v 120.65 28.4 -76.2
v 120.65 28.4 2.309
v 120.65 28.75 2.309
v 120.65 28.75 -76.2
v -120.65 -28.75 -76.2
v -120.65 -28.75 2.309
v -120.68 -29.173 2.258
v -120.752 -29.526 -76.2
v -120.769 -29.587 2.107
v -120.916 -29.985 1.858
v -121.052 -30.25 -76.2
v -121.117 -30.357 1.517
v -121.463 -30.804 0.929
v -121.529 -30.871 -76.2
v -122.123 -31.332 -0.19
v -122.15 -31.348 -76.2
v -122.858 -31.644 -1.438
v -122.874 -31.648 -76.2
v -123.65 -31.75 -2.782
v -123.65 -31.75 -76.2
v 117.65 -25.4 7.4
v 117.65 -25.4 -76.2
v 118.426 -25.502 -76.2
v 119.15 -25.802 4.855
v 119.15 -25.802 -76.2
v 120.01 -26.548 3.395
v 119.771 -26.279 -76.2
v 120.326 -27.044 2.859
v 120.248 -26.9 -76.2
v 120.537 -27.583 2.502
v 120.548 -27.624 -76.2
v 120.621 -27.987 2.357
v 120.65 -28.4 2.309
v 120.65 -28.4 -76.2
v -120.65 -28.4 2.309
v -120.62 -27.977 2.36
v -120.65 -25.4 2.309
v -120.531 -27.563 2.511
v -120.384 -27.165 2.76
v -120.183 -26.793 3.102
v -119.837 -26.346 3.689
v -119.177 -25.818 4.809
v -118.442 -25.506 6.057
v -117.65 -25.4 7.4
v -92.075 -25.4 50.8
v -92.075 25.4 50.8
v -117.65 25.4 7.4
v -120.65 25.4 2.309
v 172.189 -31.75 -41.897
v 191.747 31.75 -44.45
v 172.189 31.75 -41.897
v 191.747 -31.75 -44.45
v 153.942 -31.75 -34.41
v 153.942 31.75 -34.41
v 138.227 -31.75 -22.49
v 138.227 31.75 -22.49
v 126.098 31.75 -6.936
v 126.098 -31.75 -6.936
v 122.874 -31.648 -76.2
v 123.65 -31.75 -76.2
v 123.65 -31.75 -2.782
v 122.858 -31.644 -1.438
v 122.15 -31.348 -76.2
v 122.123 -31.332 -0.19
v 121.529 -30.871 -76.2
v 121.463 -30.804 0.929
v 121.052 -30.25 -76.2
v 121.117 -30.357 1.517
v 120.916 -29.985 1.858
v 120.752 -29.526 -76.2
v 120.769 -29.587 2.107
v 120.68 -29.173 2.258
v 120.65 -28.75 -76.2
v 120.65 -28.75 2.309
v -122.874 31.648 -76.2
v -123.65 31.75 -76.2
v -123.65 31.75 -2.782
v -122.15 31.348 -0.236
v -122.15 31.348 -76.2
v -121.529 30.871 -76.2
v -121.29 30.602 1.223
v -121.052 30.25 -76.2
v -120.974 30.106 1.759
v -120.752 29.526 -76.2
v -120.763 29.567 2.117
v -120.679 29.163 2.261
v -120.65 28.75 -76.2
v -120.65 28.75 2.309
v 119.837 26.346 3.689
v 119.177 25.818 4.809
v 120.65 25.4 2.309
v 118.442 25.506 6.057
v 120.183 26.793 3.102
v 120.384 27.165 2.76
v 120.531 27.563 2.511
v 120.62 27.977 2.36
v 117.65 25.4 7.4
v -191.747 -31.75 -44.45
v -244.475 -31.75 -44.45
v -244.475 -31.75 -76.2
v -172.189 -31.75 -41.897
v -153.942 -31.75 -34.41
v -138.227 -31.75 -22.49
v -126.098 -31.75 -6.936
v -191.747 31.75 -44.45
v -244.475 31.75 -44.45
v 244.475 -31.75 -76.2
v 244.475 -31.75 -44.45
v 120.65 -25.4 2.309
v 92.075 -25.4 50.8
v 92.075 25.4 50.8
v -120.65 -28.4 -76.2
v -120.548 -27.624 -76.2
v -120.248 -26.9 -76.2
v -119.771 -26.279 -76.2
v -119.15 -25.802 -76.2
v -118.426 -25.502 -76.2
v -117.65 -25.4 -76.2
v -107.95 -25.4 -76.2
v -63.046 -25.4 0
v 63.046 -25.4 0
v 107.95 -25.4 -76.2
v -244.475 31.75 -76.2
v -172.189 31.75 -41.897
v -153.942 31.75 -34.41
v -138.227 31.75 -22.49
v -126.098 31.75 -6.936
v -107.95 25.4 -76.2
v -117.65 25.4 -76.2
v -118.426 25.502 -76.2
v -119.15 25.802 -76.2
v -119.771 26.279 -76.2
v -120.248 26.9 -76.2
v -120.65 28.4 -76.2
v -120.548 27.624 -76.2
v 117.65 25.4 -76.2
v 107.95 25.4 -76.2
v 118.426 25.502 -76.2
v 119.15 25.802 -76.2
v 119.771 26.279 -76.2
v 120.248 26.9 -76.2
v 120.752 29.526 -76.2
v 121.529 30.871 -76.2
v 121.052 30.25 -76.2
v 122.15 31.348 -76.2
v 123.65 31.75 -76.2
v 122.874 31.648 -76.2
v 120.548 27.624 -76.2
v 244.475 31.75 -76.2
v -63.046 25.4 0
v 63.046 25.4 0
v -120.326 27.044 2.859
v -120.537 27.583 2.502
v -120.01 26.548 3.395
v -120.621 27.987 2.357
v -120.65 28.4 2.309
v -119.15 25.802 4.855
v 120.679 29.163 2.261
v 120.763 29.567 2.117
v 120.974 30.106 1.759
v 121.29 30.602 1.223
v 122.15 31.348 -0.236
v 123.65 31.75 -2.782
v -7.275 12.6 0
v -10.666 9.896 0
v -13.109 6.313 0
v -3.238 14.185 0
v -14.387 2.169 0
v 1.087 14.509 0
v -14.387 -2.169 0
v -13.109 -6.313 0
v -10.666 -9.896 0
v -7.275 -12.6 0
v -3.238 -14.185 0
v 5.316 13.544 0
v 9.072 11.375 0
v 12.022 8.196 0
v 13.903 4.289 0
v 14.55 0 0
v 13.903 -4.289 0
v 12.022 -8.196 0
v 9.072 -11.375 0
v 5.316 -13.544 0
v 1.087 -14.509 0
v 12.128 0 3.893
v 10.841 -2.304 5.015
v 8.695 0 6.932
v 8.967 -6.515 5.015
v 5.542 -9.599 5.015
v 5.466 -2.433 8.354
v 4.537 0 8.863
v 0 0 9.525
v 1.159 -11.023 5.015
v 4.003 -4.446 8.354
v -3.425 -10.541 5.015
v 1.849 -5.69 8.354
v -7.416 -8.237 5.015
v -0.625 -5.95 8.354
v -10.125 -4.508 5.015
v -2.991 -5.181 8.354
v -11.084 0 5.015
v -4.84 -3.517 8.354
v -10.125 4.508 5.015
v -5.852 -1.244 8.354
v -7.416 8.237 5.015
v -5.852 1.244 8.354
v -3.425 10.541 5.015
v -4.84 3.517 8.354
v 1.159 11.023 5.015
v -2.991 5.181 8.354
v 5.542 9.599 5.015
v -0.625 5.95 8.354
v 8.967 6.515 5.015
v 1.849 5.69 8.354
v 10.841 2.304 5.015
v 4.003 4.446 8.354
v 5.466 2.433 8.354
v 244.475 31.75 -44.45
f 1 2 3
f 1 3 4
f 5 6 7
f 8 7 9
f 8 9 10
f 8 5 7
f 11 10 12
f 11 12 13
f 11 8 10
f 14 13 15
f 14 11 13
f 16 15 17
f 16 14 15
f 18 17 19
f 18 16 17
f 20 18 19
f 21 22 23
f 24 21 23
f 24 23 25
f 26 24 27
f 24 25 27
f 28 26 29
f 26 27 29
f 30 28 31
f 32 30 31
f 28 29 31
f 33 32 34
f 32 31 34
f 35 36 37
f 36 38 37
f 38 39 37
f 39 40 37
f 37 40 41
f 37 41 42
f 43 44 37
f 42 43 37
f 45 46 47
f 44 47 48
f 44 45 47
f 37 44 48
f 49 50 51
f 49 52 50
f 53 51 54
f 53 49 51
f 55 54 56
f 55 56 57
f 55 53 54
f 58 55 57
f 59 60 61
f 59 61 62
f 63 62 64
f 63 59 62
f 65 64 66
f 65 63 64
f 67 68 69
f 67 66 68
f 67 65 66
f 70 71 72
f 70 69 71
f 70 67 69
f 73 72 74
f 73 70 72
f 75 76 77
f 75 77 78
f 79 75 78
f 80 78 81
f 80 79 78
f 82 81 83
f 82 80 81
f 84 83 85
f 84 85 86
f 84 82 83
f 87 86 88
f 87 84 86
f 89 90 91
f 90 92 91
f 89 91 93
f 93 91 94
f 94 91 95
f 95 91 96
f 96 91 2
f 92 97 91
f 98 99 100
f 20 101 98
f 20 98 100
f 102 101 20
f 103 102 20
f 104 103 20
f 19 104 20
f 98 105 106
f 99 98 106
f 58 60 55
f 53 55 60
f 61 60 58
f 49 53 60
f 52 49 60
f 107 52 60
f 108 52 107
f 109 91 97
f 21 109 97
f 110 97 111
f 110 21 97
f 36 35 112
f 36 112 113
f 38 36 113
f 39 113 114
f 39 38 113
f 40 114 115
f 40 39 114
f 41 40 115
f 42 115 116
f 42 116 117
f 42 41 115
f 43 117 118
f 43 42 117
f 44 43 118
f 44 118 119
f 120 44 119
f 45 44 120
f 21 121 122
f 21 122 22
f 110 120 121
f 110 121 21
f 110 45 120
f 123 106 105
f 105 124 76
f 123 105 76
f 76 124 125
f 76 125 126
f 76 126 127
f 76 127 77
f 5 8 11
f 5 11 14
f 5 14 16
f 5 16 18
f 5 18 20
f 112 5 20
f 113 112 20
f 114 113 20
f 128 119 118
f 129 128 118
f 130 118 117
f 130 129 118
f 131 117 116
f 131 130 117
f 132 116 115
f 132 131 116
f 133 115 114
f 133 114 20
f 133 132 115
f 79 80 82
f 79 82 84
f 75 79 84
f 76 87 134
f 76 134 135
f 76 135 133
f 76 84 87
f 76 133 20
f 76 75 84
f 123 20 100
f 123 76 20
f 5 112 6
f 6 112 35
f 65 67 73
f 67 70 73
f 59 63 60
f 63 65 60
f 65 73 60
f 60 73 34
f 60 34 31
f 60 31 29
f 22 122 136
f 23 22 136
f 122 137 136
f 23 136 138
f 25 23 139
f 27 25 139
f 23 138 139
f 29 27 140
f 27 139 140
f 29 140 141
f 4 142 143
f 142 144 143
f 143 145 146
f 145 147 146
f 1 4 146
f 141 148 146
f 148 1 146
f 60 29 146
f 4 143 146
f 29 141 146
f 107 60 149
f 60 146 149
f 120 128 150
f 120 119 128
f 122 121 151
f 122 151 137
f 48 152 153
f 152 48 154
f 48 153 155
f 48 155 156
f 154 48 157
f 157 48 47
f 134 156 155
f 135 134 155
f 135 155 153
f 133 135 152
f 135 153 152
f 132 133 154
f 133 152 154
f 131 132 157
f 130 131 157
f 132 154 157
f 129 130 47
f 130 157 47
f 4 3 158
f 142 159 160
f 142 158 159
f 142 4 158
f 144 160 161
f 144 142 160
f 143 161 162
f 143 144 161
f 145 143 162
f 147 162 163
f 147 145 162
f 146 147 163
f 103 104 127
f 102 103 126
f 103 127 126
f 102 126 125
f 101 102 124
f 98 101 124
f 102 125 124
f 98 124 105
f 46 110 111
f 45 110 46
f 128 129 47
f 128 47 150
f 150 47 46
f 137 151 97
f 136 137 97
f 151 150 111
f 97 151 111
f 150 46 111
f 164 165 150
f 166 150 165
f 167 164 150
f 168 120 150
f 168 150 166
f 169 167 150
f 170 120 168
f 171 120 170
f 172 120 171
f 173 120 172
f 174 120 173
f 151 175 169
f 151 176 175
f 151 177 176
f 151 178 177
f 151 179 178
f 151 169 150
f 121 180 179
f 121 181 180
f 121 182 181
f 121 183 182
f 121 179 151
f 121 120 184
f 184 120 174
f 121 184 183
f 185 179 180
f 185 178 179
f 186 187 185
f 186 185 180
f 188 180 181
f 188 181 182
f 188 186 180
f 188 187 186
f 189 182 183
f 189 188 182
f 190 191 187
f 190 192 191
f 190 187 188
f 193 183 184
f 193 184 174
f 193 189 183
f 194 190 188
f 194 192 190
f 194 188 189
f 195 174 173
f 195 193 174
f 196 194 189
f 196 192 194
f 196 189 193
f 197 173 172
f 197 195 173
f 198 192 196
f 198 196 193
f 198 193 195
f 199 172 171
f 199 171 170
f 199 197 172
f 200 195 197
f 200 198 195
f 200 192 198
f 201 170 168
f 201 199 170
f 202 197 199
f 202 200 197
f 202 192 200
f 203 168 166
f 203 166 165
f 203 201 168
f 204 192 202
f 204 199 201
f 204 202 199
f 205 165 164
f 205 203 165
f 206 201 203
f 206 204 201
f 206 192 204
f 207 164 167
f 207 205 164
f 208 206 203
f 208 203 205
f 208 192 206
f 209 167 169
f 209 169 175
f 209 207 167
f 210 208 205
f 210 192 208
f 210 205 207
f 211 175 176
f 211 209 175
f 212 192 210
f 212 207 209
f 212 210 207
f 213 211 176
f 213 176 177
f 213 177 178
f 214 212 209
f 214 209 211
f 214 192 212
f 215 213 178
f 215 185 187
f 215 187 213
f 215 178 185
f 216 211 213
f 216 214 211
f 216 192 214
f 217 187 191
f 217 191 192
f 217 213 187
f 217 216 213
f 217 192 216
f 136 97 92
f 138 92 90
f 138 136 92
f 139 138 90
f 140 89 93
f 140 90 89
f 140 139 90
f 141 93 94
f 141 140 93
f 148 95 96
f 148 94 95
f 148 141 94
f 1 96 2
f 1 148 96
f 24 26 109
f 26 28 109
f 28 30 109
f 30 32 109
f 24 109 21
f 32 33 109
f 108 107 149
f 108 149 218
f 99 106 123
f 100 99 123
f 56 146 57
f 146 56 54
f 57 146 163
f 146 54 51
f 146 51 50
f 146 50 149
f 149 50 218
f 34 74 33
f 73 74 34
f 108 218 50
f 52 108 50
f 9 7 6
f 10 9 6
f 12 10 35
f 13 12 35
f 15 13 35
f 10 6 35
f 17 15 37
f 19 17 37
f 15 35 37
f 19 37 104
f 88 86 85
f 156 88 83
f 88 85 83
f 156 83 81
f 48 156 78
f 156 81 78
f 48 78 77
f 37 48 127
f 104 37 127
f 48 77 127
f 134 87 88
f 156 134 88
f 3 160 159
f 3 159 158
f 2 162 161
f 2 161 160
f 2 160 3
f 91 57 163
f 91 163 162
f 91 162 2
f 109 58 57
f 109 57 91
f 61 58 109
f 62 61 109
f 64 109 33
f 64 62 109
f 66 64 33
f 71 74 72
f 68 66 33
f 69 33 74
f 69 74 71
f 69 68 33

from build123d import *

# Parameters (mm, degrees)
F1_DEPTH     = 25.4
F2_DEPTH     = 31.75
F3_T4_DEPTH  = 86.0090909091
F3_T9_DEPTH  = 86.0090909091
F3_T14_DEPTH = 86.0090909091
F3_T19_DEPTH = 86.0090909091
F3_T21_DEPTH = 93.5090909091


# Not quite as in the source:
# - a fillet or chamfer that OpenCascade refuses, or shapes differently, is made with other operations: its cross-section is extruded or revolved along the edge and cut away or added


with BuildPart() as f1:
    # F0 (on Front) → F1 (new body, symmetric)
    with BuildSketch(Plane.XZ):
        with BuildLine():
            Line((-107.95, -76.2), (-63.0464285714, 0))
            Line((-63.0464285714, 0), (0, 0))
            Line((0, 0), (0, 9.525))
            ThreePointArc((0, 9.525), (8.6950956004, 6.9319779212), (14.5496778315, 0))
            Line((14.5496778315, 0), (63.0464285714, 0))
            Line((63.0464285714, 0), (107.95, -76.2))
            Line((107.95, -76.2), (120.65, -76.2))
            Line((120.65, -76.2), (120.65, 2.3090909091))
            Line((120.65, 2.3090909091), (92.075, 50.8))
            Line((92.075, 50.8), (-92.075, 50.8))
            Line((-92.075, 50.8), (-120.65, 2.3090909091))
            Line((-120.65, 2.3090909091), (-120.65, -76.2))
            Line((-120.65, -76.2), (-107.95, -76.2))
        make_face()
        with BuildLine():
            Line((0, 9.525), (0, 0))
            Line((0, 0), (14.5496778315, 0))
            ThreePointArc((14.5496778315, 0), (8.6950956004, 6.9319779212), (0, 9.525))
        make_face()
    extrude(amount=F1_DEPTH, both=True)

    # F0 (on Front) → F2 (join, symmetric)
    with BuildSketch(Plane.XZ):
        with BuildLine():
            Line((-244.475, -76.2), (-120.65, -76.2))
            Line((-120.65, -76.2), (-120.65, 2.3090909091))
            Line((-120.65, 2.3090909091), (-126.0980906593, -6.9361538462))
            ThreePointArc((-126.0980906593, -6.9361538462), (-153.9415343258, -34.4101274299), (-191.7473214286, -44.45))
            Line((-191.7473214286, -44.45), (-244.475, -44.45))
            Line((-244.475, -44.45), (-244.475, -76.2))
        make_face()
        with BuildLine():
            Line((120.65, 2.3090909091), (120.65, -76.2))
            Line((120.65, -76.2), (244.475, -76.2))
            Line((244.475, -76.2), (244.475, -44.45))
            Line((244.475, -44.45), (191.7473214286, -44.45))
            ThreePointArc((191.7473214286, -44.45), (153.9415343258, -34.4101274299), (126.0980906593, -6.9361538462))
            Line((126.0980906593, -6.9361538462), (120.65, 2.3090909091))
        make_face()
    extrude(amount=F2_DEPTH, both=True)

    # F3: fillet of radius 3 on 8 edges, made by hand


with BuildPart() as f3_tool2:
    # F3_s3 → F3_t4 (new body)
    with BuildSketch(Plane.XY.offset(9.8090909091)):
        with BuildLine():
            ThreePointArc((-120.65, -28.4), (-119.7713203436, -26.2786796564), (-117.65, -25.4))
            Line((-117.65, -25.4), (-120.65, -25.4))
            Line((-120.65, -25.4), (-120.65, -28.4))
        make_face()
    extrude(amount=-F3_T4_DEPTH)

    split(bisect_by=Plane(origin=(-90.5622721893, 0, 53.3670532544), x_dir=(0, 1, 0), z_dir=(0.8615384615, 0, -0.5076923077)), keep=Keep.TOP)


with BuildPart() as f1_1:
    add(f1.part)

    # F3_t1: union F3_tool2
    add(f3_tool2.part)


with BuildPart() as f3_tool7:
    # F3_s8 → F3_t9 (new body)
    with BuildSketch(Plane.XY.offset(9.8090909091)):
        with BuildLine():
            ThreePointArc((-120.65, 28.4), (-119.7713203436, 26.2786796564), (-117.65, 25.4))
            Line((-117.65, 25.4), (-120.65, 25.4))
            Line((-120.65, 25.4), (-120.65, 28.4))
        make_face()
    extrude(amount=-F3_T9_DEPTH)

    split(bisect_by=Plane(origin=(-90.5622721893, 0, 53.3670532544), x_dir=(0, 1, 0), z_dir=(0.8615384615, 0, -0.5076923077)), keep=Keep.TOP)


with BuildPart() as f1_2:
    add(f1_1.part)

    # F3_t6: union F3_tool7
    add(f3_tool7.part)


with BuildPart() as f3_tool12:
    # F3_s13 → F3_t14 (new body)
    with BuildSketch(Plane.XY.offset(-76.2)):
        with BuildLine():
            ThreePointArc((117.65, 25.4), (119.7713203436, 26.2786796564), (120.65, 28.4))
            Line((120.65, 28.4), (120.65, 25.4))
            Line((120.65, 25.4), (117.65, 25.4))
        make_face()
    extrude(amount=F3_T14_DEPTH)

    split(bisect_by=Plane(origin=(90.5622721893, 0, 53.3670532544), x_dir=(0, 1, 0), z_dir=(-0.8615384615, 0, -0.5076923077)), keep=Keep.TOP)


with BuildPart() as f1_3:
    add(f1_2.part)

    # F3_t11: union F3_tool12
    add(f3_tool12.part)


with BuildPart() as f3_tool17:
    # F3_s18 → F3_t19 (new body)
    with BuildSketch(Plane.XY.offset(-76.2)):
        with BuildLine():
            ThreePointArc((117.65, -25.4), (119.7713203436, -26.2786796564), (120.65, -28.4))
            Line((120.65, -28.4), (120.65, -25.4))
            Line((120.65, -25.4), (117.65, -25.4))
        make_face()
    extrude(amount=F3_T19_DEPTH)

    split(bisect_by=Plane(origin=(90.5622721893, 0, 53.3670532544), x_dir=(0, 1, 0), z_dir=(-0.8615384615, 0, -0.5076923077)), keep=Keep.TOP)


with BuildPart() as f1_4:
    add(f1_3.part)

    # F3_t16: union F3_tool17
    add(f3_tool17.part)

    # F3_s22 → F3_t21 (cut)
    with BuildSketch(Plane.XY.offset(-83.7)):
        with BuildLine():
            ThreePointArc((-120.65, -28.75), (-121.5286796564, -30.8713203436), (-123.65, -31.75))
            Line((-123.65, -31.75), (-120.65, -31.75))
            Line((-120.65, -31.75), (-120.65, -28.75))
        make_face()
        with BuildLine():
            ThreePointArc((-123.65, 31.75), (-121.5286796564, 30.8713203436), (-120.65, 28.75))
            Line((-120.65, 28.75), (-120.65, 31.75))
            Line((-120.65, 31.75), (-123.65, 31.75))
        make_face()
        with BuildLine():
            ThreePointArc((120.65, 28.75), (121.5286796564, 30.8713203436), (123.65, 31.75))
            Line((123.65, 31.75), (120.65, 31.75))
            Line((120.65, 31.75), (120.65, 28.75))
        make_face()
        with BuildLine():
            ThreePointArc((123.65, -31.75), (121.5286796564, -30.8713203436), (120.65, -28.75))
            Line((120.65, -28.75), (120.65, -31.75))
            Line((120.65, -31.75), (123.65, -31.75))
        make_face()
    extrude(amount=F3_T21_DEPTH, mode=Mode.SUBTRACT)

    # F0 (on Front) → F4 (revolve, cut)
    with BuildSketch(Plane.XZ):
        with BuildLine():
            Line((0, 9.525), (0, 0))
            Line((0, 0), (14.5496778315, 0))
            ThreePointArc((14.5496778315, 0), (8.6950956004, 6.9319779212), (0, 9.525))
        make_face()
    revolve(axis=Axis((0, 0, 4.7625), (0, 0, -1)), mode=Mode.SUBTRACT)


solid = f1_4.part
